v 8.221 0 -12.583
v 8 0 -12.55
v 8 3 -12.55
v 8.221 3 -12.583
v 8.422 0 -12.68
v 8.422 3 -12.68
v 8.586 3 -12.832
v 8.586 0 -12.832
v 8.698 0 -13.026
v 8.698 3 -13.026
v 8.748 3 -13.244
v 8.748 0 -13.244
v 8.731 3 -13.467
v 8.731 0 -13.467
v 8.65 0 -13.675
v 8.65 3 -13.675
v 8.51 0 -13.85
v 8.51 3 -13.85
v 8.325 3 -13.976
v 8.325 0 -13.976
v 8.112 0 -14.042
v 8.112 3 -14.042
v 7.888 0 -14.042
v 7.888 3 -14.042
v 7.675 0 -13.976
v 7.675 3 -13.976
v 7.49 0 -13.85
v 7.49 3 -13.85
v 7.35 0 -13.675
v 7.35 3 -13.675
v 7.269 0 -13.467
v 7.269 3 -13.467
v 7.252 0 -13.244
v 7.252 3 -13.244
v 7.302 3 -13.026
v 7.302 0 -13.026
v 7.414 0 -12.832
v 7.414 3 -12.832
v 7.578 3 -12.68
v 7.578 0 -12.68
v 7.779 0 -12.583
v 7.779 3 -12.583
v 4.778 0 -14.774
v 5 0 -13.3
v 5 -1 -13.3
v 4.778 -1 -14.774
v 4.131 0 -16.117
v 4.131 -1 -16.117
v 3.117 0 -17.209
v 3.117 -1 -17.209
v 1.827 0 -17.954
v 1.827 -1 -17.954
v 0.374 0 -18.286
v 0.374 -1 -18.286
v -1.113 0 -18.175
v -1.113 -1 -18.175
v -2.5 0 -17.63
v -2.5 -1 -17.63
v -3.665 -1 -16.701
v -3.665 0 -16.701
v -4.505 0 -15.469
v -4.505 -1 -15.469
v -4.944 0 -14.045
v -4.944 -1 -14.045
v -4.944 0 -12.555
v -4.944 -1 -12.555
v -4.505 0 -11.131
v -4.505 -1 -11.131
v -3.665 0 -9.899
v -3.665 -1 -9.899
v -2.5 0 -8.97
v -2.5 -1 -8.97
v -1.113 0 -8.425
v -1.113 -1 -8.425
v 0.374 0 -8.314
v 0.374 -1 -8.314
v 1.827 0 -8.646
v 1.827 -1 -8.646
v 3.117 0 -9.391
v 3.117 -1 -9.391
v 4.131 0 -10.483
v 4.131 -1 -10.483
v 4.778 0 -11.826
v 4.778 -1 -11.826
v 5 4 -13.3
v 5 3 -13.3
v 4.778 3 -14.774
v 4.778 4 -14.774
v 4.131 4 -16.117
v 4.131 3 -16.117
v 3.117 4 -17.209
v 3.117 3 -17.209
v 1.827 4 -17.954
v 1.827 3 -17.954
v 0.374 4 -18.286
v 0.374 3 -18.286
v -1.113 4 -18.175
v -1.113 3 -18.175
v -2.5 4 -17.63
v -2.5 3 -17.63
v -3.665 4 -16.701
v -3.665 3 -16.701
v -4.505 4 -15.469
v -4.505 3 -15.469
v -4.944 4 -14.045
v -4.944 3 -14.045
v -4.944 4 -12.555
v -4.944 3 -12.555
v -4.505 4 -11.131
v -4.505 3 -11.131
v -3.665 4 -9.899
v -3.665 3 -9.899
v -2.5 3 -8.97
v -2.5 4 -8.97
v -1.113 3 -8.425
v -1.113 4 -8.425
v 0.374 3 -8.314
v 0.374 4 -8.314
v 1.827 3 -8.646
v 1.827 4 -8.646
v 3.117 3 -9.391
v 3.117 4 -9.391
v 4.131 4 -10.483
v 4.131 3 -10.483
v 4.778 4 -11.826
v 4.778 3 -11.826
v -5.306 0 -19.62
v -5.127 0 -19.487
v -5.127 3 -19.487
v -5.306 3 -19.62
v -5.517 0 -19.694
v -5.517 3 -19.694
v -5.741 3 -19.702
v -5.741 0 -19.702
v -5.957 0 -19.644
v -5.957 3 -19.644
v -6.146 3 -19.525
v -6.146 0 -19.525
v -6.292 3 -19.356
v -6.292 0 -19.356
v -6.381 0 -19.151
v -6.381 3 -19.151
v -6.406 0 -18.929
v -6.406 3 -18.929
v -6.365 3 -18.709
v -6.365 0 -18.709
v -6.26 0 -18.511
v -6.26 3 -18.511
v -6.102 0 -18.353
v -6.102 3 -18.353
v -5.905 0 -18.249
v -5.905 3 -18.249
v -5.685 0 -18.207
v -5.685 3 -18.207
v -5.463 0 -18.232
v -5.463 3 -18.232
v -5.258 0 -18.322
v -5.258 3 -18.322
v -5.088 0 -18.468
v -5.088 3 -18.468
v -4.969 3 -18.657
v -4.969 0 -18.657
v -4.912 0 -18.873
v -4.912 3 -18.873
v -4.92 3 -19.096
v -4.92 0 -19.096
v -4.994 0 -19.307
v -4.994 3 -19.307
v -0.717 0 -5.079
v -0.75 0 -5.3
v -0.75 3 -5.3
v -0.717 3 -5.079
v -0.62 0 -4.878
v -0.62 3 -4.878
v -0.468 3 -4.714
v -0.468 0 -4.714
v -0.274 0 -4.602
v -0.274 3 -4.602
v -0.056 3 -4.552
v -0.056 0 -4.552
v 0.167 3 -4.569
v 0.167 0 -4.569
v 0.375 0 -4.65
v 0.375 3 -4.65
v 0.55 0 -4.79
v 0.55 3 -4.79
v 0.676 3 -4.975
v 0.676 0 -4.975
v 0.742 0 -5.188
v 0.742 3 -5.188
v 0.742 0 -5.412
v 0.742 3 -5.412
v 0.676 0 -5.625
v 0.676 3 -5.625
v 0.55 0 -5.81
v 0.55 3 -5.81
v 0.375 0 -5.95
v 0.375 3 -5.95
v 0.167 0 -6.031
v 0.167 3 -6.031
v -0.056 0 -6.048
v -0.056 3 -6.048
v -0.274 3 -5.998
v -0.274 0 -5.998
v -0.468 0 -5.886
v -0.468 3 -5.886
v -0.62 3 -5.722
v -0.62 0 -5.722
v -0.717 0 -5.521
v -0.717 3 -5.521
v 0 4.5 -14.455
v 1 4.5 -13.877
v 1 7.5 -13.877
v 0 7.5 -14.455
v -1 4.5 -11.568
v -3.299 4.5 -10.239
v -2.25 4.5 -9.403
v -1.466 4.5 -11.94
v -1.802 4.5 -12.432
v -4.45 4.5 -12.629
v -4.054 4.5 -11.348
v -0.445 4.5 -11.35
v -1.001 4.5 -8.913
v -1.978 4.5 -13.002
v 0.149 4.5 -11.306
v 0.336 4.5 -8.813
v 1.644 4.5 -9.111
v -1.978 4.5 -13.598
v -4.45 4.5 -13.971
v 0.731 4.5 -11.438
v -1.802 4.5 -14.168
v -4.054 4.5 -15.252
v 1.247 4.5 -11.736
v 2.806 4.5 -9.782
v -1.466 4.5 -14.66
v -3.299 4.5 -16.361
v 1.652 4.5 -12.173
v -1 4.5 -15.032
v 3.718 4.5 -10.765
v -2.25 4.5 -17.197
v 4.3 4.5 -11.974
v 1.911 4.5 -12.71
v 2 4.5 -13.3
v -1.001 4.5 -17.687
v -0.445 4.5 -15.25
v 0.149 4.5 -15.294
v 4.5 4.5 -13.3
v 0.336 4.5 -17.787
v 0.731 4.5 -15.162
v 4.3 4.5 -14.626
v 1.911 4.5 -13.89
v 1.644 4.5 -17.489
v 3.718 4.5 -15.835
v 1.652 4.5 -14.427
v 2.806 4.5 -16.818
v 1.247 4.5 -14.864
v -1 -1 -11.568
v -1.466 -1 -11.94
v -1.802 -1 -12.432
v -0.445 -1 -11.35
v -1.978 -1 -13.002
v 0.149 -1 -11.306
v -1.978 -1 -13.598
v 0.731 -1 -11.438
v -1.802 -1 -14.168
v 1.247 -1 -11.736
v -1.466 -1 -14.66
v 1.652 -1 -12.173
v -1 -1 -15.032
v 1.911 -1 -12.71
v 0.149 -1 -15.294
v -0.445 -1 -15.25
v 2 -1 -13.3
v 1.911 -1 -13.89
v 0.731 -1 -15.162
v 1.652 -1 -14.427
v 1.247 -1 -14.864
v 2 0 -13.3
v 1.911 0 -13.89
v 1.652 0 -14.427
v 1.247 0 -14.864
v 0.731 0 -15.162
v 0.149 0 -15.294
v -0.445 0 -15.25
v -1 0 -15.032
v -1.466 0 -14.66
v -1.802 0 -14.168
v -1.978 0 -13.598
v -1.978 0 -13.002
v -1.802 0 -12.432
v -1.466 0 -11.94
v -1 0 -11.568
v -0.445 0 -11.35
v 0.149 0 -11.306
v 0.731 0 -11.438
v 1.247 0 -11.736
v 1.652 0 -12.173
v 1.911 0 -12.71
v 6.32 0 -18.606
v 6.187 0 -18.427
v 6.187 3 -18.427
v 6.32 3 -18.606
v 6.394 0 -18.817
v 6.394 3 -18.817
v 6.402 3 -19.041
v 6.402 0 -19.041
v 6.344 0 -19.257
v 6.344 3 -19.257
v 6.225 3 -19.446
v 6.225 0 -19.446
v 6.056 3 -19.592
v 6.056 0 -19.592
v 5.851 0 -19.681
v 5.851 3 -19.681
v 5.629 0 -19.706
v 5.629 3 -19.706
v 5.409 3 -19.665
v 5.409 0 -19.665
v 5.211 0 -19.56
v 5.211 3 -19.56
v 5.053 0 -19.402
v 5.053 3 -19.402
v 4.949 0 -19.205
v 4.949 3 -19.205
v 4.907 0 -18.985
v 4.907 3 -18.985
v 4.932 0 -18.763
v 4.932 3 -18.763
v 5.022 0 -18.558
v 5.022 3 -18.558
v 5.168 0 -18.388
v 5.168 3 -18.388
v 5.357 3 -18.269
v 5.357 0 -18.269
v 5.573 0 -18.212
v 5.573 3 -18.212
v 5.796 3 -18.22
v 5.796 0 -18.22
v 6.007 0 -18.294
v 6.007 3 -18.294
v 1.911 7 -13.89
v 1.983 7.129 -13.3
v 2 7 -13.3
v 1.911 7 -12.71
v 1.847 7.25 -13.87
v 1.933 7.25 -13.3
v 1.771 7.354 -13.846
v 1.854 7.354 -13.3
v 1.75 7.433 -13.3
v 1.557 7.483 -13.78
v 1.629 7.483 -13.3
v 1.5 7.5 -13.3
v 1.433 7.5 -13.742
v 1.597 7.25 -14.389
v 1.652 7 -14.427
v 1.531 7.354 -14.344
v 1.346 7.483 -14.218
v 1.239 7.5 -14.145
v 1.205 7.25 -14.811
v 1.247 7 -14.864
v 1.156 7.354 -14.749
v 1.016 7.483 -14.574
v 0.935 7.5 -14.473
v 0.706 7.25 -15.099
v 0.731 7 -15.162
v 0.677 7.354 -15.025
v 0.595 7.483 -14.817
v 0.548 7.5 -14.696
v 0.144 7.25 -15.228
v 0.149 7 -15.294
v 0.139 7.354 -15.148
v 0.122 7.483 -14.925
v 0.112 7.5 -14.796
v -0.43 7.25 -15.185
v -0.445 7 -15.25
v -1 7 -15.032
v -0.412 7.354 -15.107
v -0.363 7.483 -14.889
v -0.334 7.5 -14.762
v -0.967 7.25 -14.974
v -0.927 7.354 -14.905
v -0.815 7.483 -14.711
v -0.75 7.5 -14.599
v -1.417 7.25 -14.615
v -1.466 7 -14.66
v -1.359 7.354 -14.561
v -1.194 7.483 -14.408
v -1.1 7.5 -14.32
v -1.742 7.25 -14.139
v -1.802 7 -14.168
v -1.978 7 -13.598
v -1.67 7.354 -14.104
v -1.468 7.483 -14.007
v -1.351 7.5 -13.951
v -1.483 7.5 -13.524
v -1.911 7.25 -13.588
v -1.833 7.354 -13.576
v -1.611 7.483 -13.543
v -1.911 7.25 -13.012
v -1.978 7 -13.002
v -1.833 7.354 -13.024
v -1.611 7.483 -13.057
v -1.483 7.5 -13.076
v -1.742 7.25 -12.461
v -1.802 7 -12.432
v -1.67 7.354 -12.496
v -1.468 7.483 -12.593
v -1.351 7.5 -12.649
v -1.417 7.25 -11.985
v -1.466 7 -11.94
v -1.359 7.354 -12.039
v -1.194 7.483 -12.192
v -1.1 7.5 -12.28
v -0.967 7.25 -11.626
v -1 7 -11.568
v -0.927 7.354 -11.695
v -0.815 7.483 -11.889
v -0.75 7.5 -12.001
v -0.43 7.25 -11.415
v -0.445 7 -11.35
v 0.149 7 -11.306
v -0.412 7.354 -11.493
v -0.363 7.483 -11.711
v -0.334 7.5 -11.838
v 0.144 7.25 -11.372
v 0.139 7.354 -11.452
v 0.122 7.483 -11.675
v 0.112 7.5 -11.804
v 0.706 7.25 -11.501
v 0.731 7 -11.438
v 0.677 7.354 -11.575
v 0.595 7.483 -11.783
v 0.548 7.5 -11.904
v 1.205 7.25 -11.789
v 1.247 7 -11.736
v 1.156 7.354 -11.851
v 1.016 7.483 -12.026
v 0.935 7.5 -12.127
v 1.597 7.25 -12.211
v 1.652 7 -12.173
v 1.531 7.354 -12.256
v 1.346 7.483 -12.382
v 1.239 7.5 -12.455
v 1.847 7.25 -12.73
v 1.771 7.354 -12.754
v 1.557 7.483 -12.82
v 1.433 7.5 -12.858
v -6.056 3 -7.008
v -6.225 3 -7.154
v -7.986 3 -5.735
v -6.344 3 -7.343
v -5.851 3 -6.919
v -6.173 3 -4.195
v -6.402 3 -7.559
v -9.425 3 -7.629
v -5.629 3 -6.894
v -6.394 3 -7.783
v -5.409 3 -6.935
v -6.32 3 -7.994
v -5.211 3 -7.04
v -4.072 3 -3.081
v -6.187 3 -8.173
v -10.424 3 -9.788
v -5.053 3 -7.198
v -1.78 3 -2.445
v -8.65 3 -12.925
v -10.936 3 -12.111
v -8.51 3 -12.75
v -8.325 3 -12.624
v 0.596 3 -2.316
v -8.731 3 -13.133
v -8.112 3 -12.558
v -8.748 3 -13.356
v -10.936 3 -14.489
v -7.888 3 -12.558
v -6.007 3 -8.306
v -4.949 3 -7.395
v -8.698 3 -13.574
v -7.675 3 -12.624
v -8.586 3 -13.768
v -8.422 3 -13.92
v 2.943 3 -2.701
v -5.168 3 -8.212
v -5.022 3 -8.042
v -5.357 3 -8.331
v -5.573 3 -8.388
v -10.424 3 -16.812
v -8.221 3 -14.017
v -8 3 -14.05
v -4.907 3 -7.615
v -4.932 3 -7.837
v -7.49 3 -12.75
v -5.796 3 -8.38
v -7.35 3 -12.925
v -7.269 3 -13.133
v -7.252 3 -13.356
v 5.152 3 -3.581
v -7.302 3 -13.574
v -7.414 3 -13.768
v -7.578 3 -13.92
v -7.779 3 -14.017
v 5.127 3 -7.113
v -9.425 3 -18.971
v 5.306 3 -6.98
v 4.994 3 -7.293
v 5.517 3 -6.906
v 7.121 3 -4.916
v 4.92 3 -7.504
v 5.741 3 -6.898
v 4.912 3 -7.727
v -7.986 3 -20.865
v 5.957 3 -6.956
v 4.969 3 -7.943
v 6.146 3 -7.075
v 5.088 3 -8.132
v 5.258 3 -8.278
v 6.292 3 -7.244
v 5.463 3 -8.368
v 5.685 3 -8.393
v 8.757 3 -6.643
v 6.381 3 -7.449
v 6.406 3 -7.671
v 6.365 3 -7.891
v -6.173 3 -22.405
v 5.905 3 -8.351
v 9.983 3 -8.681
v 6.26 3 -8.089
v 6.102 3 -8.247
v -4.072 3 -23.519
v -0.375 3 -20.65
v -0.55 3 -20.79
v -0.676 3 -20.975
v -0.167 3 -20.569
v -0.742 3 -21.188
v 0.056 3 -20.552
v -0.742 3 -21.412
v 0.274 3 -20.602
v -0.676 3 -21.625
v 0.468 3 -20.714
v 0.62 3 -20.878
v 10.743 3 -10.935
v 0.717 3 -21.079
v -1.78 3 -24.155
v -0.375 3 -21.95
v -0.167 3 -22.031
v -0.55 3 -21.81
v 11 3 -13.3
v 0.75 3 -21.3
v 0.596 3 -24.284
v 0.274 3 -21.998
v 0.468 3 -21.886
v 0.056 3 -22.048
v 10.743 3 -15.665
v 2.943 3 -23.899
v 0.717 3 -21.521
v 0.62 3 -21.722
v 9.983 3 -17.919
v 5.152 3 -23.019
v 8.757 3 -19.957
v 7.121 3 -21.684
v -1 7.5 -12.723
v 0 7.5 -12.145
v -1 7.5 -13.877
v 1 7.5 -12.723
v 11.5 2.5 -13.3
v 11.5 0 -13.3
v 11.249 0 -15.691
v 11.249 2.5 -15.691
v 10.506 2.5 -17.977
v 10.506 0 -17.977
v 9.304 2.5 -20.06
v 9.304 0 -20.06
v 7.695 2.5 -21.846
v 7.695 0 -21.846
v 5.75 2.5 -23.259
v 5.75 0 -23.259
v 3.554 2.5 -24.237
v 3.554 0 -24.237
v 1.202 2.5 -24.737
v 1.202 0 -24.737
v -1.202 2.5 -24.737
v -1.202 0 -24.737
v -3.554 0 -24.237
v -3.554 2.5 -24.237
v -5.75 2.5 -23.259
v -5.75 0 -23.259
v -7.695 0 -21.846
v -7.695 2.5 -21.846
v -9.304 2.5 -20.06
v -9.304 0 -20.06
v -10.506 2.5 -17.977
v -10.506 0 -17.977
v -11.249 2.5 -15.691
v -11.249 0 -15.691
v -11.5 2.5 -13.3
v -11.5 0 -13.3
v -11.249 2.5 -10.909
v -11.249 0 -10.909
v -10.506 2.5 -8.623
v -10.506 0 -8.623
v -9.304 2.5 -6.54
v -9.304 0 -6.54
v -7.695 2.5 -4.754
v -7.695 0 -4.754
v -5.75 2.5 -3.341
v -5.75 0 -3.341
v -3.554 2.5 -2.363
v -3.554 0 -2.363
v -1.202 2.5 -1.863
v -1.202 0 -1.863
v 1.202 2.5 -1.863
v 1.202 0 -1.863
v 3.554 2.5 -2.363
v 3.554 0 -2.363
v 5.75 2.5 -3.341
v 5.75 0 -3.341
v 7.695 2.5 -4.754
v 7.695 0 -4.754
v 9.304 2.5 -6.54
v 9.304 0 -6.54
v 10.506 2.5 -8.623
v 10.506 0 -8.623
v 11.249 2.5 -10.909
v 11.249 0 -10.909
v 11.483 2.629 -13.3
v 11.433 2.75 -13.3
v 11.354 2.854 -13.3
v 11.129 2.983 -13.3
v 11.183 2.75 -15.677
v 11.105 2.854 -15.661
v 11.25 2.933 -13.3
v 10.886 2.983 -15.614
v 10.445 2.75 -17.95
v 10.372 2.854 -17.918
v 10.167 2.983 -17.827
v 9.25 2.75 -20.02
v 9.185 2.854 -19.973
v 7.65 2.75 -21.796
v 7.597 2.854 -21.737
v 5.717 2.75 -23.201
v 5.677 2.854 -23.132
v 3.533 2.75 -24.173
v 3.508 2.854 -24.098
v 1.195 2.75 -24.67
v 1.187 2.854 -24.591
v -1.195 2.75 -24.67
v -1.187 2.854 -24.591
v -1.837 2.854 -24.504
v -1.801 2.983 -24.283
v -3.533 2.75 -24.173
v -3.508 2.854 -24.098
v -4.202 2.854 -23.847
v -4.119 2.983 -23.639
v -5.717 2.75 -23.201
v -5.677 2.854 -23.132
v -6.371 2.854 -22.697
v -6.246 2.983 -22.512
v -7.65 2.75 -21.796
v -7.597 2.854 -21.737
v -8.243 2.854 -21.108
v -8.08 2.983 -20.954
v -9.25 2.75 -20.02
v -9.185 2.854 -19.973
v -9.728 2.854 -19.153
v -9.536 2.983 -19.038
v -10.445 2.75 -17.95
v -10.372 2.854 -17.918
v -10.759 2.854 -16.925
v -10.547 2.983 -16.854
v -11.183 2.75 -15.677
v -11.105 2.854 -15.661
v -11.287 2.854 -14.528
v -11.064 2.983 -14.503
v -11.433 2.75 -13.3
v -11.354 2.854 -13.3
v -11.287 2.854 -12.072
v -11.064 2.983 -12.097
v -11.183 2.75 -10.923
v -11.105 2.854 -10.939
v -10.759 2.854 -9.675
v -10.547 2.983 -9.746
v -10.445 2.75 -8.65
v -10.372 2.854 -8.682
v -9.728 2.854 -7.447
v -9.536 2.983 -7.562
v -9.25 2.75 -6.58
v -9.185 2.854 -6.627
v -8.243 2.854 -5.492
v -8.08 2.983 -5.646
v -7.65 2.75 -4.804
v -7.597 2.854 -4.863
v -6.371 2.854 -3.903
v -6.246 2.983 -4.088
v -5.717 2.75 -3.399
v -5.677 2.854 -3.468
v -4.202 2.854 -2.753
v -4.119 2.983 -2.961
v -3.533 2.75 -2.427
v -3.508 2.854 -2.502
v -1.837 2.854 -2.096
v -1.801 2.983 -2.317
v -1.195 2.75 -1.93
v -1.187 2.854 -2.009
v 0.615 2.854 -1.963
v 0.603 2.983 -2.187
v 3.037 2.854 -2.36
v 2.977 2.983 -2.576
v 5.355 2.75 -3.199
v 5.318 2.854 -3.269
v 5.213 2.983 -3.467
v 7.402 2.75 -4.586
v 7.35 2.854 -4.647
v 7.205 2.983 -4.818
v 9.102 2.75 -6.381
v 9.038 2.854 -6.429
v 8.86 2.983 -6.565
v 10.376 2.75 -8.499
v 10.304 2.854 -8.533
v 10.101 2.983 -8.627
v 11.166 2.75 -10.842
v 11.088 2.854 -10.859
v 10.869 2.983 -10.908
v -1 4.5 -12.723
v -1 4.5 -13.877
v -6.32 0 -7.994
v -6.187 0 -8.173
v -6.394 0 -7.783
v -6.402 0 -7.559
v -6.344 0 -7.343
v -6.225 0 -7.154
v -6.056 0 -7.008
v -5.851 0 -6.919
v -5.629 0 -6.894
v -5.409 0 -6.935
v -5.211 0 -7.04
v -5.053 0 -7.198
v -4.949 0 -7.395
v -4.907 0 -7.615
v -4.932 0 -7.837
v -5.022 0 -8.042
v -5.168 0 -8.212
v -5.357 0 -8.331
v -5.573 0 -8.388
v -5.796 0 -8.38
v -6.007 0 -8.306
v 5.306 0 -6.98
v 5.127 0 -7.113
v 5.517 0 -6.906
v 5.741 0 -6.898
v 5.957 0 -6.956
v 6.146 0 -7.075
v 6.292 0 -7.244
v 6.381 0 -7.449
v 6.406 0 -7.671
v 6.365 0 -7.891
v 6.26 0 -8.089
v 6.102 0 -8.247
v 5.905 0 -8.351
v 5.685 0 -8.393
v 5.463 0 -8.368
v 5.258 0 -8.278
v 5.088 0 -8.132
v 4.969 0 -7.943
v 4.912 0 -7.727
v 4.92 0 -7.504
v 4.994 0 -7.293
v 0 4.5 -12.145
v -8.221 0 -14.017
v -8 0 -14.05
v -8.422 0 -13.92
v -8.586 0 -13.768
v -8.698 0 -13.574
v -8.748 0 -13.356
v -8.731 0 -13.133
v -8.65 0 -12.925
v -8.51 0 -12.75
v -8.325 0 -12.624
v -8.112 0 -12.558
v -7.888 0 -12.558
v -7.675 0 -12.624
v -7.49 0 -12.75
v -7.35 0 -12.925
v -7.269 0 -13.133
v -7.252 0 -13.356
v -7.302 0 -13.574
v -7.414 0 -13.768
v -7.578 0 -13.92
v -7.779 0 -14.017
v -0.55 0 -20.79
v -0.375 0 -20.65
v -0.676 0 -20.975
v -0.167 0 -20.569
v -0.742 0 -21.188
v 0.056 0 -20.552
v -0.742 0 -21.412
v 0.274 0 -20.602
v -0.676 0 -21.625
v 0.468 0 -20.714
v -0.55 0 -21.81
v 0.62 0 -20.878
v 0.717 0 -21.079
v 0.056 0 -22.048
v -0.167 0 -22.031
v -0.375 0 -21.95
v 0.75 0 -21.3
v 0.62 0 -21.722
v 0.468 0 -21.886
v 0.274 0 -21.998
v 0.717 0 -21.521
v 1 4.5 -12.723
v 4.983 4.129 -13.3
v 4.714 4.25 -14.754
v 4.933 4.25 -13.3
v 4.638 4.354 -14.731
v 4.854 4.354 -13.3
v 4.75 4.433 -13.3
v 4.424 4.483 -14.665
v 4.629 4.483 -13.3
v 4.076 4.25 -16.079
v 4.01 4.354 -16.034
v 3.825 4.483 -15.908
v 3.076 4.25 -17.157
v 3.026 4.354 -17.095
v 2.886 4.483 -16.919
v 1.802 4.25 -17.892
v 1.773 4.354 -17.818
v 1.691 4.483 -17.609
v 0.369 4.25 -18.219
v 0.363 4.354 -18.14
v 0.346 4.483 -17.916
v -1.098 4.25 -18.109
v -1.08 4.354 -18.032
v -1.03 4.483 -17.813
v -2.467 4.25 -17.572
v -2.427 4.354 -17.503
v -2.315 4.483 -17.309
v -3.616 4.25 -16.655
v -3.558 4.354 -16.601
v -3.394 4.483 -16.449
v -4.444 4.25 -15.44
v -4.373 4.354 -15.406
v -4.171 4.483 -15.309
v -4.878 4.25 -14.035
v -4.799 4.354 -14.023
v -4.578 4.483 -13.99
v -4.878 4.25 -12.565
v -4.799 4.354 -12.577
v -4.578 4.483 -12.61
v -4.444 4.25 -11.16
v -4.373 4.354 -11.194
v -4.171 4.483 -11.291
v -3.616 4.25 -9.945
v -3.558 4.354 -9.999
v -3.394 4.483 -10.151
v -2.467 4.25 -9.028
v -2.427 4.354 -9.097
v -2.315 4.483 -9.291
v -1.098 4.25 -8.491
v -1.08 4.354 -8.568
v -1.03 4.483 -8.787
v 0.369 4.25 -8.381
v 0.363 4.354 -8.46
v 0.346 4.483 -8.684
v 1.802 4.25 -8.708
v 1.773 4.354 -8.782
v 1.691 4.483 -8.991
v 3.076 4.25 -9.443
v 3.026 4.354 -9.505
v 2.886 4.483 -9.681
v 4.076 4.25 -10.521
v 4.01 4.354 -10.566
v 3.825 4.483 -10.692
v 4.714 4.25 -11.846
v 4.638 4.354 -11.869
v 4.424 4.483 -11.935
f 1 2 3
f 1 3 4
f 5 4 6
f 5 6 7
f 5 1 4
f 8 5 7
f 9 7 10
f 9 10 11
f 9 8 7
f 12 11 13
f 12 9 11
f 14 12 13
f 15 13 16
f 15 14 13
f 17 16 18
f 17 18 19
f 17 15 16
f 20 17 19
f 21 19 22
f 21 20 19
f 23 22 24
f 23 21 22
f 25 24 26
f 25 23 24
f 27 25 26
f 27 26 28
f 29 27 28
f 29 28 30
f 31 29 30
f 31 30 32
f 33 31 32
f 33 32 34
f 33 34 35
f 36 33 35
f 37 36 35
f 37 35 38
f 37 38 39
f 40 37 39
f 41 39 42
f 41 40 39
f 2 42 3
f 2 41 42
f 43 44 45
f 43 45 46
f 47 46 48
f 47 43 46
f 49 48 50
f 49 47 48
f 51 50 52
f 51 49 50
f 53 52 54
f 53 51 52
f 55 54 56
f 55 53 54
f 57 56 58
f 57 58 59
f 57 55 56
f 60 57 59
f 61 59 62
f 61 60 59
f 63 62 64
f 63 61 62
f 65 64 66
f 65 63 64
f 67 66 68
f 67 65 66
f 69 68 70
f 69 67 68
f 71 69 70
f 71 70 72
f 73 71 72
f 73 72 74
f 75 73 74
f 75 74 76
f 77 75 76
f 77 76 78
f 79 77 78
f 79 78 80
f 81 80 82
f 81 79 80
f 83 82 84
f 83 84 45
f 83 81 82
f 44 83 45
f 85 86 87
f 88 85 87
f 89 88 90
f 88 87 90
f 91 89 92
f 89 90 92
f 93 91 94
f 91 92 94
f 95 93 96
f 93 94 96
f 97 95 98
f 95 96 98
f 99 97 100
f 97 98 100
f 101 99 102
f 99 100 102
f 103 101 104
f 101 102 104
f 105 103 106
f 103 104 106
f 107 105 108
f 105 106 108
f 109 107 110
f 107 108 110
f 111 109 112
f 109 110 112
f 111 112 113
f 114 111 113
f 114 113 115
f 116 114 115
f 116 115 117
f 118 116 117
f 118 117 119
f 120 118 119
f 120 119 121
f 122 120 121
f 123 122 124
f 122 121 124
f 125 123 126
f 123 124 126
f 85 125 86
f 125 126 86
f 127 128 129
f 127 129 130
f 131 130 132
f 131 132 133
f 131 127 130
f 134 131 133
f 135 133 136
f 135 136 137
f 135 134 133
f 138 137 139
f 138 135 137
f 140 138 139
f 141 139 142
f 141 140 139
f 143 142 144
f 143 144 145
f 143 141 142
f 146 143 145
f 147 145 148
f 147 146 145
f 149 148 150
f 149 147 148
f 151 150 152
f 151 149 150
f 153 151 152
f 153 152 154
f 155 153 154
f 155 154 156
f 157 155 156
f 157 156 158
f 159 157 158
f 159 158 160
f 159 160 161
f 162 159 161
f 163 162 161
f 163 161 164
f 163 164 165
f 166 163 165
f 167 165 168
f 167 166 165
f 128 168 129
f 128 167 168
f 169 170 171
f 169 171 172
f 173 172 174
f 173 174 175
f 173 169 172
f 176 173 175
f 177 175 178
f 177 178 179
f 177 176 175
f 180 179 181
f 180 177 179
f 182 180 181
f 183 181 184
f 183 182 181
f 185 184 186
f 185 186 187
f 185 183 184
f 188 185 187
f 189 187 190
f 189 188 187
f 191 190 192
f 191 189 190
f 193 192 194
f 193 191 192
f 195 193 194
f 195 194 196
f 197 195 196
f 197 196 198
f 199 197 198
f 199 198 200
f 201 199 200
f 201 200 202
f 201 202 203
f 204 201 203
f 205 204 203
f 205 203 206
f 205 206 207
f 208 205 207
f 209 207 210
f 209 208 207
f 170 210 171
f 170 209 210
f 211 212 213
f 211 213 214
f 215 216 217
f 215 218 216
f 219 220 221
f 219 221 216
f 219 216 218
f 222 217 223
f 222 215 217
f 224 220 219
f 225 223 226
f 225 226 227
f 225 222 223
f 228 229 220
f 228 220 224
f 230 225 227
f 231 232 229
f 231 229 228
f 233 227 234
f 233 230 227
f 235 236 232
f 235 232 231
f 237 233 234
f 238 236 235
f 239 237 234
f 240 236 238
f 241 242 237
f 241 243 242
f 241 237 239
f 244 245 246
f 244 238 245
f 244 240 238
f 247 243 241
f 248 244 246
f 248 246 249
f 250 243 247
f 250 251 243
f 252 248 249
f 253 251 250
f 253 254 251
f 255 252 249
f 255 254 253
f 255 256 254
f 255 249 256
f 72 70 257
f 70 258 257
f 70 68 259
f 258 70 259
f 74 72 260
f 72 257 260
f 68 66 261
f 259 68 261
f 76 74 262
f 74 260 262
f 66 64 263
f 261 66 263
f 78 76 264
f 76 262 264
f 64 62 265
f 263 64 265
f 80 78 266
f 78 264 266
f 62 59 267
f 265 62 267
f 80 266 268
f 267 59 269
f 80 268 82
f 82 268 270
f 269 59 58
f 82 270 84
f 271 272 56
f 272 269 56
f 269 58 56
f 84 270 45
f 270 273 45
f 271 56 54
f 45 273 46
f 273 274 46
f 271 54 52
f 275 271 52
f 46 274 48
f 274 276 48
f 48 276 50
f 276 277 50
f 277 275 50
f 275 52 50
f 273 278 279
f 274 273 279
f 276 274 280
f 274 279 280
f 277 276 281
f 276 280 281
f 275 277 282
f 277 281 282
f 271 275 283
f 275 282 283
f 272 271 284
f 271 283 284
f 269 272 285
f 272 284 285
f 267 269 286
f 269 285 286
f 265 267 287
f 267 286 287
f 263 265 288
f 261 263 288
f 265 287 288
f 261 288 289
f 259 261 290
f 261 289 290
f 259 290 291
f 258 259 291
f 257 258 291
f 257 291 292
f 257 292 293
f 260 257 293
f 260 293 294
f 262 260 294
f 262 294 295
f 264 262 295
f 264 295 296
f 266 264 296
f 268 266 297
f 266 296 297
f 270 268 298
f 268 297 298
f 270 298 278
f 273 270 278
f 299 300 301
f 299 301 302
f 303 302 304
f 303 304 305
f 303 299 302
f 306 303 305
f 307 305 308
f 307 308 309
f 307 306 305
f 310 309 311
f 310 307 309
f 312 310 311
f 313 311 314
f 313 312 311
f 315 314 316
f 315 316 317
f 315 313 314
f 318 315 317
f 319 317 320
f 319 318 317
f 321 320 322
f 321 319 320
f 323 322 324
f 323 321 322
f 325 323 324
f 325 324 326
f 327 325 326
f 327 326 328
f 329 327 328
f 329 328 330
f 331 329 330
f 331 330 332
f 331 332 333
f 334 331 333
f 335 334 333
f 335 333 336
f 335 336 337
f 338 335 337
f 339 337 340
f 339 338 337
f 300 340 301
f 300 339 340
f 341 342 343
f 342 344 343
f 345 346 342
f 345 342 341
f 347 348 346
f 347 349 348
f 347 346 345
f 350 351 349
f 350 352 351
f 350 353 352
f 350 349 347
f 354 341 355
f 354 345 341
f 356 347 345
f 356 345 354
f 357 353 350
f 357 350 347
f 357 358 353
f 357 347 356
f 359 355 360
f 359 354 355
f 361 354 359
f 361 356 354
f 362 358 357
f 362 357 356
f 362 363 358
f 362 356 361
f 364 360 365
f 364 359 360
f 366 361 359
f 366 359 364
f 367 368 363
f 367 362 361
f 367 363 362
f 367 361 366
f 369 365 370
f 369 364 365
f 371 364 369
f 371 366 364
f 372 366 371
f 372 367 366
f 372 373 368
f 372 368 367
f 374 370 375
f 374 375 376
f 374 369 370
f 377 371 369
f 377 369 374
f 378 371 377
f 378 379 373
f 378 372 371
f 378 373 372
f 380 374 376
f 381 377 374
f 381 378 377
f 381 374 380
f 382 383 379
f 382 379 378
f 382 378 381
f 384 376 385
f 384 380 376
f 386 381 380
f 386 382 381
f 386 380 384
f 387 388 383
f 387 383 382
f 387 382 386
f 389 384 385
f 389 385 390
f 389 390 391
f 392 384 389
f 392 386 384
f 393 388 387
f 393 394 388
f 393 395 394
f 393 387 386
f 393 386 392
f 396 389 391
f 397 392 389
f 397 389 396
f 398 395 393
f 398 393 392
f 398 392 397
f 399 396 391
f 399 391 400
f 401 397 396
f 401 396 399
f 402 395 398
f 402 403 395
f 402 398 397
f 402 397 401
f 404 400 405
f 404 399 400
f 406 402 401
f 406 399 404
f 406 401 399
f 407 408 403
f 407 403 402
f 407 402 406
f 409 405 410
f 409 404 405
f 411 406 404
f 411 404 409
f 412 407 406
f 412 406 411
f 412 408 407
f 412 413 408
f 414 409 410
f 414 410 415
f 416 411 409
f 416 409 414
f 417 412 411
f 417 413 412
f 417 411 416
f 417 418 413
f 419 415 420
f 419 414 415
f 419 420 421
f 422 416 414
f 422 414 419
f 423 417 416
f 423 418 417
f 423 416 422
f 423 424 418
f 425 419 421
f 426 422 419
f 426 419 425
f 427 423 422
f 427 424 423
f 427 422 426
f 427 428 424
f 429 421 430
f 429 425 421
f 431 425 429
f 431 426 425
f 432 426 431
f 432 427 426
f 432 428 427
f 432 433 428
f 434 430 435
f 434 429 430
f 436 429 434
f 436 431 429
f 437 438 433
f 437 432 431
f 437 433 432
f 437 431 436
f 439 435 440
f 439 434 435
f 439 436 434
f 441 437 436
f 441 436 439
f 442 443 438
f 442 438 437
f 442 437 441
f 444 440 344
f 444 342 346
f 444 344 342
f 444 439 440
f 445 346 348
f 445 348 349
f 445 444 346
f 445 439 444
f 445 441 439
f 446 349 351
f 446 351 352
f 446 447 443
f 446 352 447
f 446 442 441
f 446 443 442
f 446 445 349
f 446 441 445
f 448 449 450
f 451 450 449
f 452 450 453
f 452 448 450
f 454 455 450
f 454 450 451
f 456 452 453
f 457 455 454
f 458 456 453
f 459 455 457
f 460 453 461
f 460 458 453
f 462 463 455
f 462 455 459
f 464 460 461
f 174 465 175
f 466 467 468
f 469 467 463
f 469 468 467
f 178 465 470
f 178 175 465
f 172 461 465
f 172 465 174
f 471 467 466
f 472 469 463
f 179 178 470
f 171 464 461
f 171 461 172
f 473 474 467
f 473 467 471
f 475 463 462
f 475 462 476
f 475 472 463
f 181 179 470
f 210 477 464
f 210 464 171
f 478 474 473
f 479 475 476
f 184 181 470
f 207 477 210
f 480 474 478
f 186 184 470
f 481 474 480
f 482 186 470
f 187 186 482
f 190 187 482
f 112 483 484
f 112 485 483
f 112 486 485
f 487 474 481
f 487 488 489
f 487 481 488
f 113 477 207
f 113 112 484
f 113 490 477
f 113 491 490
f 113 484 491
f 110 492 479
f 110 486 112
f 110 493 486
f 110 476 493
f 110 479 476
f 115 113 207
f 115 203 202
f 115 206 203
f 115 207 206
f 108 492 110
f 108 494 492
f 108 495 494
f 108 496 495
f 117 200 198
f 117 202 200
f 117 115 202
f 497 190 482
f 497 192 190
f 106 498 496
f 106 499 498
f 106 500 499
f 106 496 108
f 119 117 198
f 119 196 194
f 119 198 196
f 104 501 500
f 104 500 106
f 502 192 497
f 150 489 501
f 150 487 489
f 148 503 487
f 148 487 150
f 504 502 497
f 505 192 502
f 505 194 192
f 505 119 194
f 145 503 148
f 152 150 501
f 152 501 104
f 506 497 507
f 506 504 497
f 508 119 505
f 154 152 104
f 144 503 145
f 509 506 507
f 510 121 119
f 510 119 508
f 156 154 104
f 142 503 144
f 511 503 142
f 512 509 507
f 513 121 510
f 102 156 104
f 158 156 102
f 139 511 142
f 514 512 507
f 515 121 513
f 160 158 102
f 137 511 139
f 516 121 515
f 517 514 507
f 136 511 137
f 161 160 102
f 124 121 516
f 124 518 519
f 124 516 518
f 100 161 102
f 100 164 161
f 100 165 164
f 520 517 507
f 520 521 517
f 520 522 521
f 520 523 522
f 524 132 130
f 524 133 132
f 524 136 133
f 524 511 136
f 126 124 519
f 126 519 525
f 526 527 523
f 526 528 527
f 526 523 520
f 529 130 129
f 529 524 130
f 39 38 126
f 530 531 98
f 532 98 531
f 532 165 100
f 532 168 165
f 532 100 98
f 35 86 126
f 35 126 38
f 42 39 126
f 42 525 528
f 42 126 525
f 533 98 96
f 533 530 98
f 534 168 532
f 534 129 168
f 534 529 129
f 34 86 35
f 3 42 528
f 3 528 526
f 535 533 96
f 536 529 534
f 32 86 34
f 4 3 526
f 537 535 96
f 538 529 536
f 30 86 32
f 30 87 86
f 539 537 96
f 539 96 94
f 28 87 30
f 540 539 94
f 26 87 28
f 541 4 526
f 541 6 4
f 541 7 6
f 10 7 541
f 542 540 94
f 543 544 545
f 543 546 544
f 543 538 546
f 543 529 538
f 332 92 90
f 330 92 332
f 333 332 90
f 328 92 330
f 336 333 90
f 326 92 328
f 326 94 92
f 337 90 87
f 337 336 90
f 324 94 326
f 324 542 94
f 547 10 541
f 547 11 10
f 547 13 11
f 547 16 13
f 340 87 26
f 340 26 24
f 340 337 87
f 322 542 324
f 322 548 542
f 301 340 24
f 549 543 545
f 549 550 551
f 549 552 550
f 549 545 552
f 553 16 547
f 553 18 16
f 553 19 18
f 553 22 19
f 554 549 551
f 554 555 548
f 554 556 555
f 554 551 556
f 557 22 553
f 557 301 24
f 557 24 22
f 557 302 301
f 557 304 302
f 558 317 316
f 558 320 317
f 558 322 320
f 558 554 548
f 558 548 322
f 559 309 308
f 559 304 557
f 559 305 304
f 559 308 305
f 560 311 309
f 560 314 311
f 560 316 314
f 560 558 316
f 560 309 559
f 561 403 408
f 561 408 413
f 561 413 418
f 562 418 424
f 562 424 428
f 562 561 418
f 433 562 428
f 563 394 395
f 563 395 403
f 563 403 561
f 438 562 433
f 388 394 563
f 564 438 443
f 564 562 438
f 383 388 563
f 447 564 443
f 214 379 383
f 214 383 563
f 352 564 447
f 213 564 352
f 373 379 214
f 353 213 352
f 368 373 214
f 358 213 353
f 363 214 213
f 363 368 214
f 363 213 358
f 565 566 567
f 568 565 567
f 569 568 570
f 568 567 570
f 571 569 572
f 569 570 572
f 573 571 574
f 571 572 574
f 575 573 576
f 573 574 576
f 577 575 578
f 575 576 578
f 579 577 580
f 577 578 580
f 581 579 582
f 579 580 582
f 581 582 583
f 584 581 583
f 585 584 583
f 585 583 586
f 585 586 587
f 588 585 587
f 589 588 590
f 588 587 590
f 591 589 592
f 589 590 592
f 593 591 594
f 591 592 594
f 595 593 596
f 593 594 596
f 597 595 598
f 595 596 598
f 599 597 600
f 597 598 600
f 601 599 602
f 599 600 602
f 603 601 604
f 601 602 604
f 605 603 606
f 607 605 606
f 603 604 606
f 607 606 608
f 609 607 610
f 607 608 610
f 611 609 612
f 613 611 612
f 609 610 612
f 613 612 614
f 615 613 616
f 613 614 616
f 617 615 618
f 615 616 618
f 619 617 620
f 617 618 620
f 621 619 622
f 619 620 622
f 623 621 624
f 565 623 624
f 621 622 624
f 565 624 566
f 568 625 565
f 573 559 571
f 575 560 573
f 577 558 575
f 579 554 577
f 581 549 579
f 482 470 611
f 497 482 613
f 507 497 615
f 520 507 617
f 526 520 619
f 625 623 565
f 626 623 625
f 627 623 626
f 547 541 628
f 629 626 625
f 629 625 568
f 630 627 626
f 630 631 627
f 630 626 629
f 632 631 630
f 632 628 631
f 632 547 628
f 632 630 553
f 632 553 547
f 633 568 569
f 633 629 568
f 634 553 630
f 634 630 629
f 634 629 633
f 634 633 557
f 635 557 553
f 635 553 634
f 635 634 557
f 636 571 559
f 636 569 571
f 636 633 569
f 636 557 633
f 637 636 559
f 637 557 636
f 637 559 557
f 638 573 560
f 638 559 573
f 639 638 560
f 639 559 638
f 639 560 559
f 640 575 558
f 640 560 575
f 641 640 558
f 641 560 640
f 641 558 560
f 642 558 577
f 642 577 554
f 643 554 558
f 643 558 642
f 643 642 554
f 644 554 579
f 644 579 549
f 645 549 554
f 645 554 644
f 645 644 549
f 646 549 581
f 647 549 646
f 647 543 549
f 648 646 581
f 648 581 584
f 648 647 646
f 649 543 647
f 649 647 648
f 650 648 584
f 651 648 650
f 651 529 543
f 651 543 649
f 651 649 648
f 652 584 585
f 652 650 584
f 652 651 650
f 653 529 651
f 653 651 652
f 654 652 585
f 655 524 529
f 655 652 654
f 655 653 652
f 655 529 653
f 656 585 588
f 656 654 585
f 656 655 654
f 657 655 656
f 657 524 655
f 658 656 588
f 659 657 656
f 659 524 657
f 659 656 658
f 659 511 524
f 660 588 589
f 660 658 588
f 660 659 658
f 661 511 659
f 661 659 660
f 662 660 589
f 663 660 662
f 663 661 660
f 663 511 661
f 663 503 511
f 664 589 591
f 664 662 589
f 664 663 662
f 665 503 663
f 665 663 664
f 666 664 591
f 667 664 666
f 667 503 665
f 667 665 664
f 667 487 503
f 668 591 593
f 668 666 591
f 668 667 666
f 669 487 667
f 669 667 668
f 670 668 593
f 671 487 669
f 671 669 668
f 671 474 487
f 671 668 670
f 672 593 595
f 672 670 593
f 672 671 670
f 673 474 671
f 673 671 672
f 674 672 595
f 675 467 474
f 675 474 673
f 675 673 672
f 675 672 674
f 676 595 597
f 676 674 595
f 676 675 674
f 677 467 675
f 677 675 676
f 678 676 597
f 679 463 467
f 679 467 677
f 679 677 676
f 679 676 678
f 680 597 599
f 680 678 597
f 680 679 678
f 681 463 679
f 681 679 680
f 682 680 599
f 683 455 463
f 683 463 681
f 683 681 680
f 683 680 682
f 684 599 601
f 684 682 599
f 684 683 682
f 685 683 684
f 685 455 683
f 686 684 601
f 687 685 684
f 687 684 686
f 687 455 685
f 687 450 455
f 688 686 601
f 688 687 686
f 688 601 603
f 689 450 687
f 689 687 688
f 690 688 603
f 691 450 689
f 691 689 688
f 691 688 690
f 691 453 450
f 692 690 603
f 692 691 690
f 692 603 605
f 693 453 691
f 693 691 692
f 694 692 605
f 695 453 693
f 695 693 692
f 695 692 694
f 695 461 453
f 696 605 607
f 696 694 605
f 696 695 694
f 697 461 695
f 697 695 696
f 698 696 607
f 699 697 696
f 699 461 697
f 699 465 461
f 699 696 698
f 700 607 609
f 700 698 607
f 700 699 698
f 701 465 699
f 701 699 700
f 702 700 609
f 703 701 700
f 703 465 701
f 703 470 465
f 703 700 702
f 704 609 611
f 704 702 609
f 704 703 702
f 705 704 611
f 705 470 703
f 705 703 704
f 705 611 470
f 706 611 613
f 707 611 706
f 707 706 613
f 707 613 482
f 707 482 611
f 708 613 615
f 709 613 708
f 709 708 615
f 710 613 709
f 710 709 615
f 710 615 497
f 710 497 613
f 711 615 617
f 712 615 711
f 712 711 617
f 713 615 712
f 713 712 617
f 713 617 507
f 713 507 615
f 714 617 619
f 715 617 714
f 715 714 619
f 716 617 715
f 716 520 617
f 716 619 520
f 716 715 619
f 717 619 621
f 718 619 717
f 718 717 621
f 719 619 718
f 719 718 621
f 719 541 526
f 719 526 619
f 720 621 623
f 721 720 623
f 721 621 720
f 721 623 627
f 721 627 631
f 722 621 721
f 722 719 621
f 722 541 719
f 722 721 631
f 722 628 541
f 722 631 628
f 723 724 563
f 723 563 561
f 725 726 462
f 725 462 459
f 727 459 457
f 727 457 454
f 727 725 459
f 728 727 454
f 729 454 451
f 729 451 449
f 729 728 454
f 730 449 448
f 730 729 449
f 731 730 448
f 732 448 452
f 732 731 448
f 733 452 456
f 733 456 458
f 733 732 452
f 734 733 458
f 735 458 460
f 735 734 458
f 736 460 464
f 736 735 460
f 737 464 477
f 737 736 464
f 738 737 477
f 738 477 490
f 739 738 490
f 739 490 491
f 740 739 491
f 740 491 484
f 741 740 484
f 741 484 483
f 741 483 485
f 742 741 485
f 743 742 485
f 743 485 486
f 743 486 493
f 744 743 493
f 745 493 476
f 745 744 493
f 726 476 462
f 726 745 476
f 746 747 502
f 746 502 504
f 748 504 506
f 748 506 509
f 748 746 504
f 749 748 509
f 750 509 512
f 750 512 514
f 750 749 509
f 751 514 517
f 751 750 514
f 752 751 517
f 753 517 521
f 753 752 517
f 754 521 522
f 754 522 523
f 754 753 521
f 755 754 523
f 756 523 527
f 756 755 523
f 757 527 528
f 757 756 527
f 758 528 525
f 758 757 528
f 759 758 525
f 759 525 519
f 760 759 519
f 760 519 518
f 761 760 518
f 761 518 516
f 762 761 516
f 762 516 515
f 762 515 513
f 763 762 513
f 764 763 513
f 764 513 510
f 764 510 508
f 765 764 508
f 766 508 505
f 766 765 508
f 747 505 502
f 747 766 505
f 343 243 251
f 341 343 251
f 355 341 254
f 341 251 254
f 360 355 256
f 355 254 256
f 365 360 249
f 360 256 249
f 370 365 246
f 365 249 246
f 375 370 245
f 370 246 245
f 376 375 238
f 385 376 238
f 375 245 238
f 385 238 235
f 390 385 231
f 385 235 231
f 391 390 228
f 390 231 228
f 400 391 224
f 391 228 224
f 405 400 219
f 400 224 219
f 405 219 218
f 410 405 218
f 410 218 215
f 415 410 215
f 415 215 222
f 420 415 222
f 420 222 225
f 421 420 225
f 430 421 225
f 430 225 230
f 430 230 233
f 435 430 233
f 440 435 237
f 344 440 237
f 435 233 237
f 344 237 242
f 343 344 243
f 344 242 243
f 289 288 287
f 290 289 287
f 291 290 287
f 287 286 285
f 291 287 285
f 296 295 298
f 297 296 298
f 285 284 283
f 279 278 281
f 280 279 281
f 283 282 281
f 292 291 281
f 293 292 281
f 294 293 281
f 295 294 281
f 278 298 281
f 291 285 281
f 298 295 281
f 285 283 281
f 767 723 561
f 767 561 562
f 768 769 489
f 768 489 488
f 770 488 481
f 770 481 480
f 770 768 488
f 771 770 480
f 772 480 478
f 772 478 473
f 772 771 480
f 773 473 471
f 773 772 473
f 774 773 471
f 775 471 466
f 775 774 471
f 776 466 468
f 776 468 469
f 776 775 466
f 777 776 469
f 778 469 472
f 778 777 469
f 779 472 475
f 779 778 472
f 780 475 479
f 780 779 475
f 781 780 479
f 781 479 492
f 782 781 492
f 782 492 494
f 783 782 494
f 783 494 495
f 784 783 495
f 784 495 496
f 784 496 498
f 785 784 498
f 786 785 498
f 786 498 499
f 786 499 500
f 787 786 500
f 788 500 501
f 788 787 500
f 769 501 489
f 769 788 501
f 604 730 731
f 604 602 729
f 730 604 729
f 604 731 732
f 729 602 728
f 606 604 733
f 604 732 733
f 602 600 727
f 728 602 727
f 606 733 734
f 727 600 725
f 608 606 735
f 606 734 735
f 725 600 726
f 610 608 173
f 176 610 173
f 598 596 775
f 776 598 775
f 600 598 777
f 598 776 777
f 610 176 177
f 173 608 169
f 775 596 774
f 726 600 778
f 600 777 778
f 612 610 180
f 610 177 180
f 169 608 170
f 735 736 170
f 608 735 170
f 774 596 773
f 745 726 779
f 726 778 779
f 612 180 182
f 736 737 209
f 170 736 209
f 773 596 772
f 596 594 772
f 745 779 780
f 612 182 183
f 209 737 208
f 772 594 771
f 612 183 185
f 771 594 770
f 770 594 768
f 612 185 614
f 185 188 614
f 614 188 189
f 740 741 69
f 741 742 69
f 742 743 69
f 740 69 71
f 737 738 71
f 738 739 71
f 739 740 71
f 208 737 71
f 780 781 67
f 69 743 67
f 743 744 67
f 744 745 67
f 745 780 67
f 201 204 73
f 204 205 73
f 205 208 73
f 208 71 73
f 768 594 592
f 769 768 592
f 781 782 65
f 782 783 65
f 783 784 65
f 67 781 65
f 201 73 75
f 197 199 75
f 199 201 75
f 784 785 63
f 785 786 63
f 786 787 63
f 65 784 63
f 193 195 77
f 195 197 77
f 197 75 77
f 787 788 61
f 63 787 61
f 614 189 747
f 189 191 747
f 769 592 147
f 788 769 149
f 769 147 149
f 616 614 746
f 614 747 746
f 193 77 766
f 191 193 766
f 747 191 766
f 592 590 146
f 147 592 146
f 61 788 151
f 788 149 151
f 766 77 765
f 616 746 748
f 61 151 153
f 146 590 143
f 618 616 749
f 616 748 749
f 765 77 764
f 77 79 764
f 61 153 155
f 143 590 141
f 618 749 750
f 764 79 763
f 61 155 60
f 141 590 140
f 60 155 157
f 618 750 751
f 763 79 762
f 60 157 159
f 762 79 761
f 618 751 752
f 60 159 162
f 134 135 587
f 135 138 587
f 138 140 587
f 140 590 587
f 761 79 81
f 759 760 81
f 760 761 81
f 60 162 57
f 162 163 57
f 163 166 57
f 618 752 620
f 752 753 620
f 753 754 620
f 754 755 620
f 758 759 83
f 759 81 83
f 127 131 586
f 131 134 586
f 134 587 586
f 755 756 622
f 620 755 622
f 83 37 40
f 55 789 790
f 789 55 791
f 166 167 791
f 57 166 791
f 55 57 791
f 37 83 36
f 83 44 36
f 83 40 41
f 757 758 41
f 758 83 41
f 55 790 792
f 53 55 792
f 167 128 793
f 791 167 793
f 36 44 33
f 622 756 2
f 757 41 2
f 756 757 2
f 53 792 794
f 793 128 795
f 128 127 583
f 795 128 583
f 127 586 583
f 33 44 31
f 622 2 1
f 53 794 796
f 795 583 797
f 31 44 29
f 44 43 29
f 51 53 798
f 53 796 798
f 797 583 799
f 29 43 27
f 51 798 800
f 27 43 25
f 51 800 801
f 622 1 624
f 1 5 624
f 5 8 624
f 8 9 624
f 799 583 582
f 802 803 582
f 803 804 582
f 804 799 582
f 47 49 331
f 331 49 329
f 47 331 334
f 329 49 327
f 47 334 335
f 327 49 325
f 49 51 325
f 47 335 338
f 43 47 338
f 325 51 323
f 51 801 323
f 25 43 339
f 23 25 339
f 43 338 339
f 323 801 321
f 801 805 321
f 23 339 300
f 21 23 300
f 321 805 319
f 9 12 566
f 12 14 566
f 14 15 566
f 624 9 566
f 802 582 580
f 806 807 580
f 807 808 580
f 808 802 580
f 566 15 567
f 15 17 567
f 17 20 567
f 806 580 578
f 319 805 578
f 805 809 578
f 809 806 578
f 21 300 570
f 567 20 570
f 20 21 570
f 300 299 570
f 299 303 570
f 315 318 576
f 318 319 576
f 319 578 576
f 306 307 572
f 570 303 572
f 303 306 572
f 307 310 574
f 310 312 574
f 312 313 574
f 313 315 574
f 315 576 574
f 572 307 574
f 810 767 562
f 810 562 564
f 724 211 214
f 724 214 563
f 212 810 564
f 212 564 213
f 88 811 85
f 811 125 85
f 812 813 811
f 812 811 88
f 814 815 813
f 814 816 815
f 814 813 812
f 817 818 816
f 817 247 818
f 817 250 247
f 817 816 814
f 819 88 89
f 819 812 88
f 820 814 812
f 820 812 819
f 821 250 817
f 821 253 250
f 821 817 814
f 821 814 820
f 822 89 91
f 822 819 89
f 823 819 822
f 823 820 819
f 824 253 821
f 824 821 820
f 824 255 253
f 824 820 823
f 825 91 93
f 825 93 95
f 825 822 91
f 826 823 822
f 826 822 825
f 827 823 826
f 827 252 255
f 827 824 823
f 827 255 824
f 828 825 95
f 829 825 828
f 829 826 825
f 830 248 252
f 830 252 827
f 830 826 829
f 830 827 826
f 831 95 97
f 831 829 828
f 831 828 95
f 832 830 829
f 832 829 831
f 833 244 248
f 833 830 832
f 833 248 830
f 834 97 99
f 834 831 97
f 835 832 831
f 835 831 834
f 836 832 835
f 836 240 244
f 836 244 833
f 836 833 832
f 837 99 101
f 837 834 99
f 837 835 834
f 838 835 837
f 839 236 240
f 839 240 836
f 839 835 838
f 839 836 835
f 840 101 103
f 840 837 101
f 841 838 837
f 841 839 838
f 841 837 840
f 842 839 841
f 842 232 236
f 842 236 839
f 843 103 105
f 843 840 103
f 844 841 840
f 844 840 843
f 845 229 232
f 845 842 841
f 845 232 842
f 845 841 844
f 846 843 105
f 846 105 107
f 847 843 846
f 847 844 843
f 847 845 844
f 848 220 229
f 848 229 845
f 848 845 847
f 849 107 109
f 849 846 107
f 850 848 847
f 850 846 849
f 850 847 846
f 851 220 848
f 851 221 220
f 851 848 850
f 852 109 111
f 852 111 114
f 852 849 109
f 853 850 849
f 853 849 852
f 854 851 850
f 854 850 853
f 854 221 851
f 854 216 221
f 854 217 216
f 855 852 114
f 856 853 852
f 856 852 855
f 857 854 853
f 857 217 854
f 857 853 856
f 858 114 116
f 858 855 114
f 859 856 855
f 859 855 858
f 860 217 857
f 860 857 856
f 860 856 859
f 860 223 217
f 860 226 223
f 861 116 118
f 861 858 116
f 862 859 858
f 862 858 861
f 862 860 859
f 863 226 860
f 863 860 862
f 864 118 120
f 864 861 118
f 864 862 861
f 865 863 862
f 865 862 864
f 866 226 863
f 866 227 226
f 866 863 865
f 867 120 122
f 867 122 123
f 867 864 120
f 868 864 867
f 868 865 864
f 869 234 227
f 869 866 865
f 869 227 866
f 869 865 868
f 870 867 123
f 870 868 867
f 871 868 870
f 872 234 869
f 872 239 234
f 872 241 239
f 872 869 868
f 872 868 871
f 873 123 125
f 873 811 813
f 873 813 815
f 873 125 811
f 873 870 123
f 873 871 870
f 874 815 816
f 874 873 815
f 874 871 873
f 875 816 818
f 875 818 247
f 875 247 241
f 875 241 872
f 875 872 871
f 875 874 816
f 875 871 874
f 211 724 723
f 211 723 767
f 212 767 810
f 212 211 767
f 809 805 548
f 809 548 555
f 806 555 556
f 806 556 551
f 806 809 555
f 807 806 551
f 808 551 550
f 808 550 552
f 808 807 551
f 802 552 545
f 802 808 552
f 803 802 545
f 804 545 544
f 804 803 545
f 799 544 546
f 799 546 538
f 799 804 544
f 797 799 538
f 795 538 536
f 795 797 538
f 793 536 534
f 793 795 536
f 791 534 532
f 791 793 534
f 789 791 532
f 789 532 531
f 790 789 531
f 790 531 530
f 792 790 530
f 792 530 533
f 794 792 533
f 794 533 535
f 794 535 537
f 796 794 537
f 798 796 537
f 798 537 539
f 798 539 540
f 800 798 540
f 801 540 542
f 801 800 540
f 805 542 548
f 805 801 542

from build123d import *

# Parameters (mm, degrees)
CROQUIS1_R              = 11.5
SALIENTE_EXTRUIR1_DEPTH = 3
CROQUIS1_9_R            = 0.75
CORTAR_EXTRUIR2_DEPTH   = 3
MATRIZC2_COUNT          = 8
SALIENTE_EXTRUIR2_START = 3
CROQUIS1_11_R           = 5
SALIENTE_EXTRUIR2_DEPTH = 1.5
SALIENTE_EXTRUIR3_START = 4.5
CROQUIS1_12_R           = 2
SALIENTE_EXTRUIR3_DEPTH = 3
REDONDEO1_R             = 0.5
CROQUIS1_13_R           = 5
CROQUIS1_13_R_2         = 2
SALIENTE_EXTRUIR4_DEPTH = 1


with BuildPart() as part:
    # Croquis1 → Saliente-Extruir1 (new body)
    with BuildSketch(Plane(origin=(0, 0, 0), x_dir=(1, 0, 0), z_dir=(0, 1, 0))):
        with Locations((0, 13.3)):
            Circle(CROQUIS1_R)
    extrude(amount=SALIENTE_EXTRUIR1_DEPTH)

    # Croquis1<9> → Cortar-Extruir2 (cut)
    with BuildSketch(Plane(origin=(0, 0, 0), x_dir=(1, 0, 0), z_dir=(0, 1, 0))):
        with Locations((0, 21.3)):
            Circle(CROQUIS1_9_R)
    cortar_extruir2 = extrude(amount=CORTAR_EXTRUIR2_DEPTH, mode=Mode.SUBTRACT)

    # MatrizC2: Cortar-Extruir2 ×8 about axis
    matrizc2_axis = Axis((0, 0, -13.3), (0, 1, 0))
    for i in range(1, MATRIZC2_COUNT):
        add(cortar_extruir2.rotate(matrizc2_axis, i * 360 / MATRIZC2_COUNT), mode=Mode.SUBTRACT)

    # Croquis1<11> → Saliente-Extruir2 (add)
    with BuildSketch(Plane(origin=(0, 0, 0), x_dir=(1, 0, 0), z_dir=(0, 1, 0)).offset(SALIENTE_EXTRUIR2_START)):
        with Locations((0, 13.3)):
            Circle(CROQUIS1_11_R)
    extrude(amount=SALIENTE_EXTRUIR2_DEPTH)

    # Croquis1<12> → Saliente-Extruir3 (add)
    with BuildSketch(Plane(origin=(0, 0, 0), x_dir=(1, 0, 0), z_dir=(0, 1, 0)).offset(SALIENTE_EXTRUIR3_START)):
        with Locations((0, 13.3)):
            Circle(CROQUIS1_12_R)
        Polygon((1, 12.722649731), (1, 13.877350269), (0, 14.454700538), (-1, 13.877350269), (-1, 12.722649731), (0, 12.145299462), align=None, mode=Mode.SUBTRACT)
    extrude(amount=SALIENTE_EXTRUIR3_DEPTH)

    # Redondeo1
    redondeo1_edges = [part.edges().sort_by_distance(p)[0] for p in [
        (-11.5, 3, -13.3),
        (-5, 4.5, -13.3),
        (-2, 7.5, -13.3),
    ]]
    fillet(redondeo1_edges, radius=REDONDEO1_R)

    # Croquis1<13> → Saliente-Extruir4 (add)
    with BuildSketch(Plane(origin=(0, 0, 0), x_dir=(1, 0, 0), z_dir=(0, 1, 0))):
        with Locations((0, 13.3)):
            Circle(CROQUIS1_13_R)
        with Locations((0, 13.3)):
            Circle(CROQUIS1_13_R_2, mode=Mode.SUBTRACT)
    extrude(amount=-SALIENTE_EXTRUIR4_DEPTH)


solid = part.part
